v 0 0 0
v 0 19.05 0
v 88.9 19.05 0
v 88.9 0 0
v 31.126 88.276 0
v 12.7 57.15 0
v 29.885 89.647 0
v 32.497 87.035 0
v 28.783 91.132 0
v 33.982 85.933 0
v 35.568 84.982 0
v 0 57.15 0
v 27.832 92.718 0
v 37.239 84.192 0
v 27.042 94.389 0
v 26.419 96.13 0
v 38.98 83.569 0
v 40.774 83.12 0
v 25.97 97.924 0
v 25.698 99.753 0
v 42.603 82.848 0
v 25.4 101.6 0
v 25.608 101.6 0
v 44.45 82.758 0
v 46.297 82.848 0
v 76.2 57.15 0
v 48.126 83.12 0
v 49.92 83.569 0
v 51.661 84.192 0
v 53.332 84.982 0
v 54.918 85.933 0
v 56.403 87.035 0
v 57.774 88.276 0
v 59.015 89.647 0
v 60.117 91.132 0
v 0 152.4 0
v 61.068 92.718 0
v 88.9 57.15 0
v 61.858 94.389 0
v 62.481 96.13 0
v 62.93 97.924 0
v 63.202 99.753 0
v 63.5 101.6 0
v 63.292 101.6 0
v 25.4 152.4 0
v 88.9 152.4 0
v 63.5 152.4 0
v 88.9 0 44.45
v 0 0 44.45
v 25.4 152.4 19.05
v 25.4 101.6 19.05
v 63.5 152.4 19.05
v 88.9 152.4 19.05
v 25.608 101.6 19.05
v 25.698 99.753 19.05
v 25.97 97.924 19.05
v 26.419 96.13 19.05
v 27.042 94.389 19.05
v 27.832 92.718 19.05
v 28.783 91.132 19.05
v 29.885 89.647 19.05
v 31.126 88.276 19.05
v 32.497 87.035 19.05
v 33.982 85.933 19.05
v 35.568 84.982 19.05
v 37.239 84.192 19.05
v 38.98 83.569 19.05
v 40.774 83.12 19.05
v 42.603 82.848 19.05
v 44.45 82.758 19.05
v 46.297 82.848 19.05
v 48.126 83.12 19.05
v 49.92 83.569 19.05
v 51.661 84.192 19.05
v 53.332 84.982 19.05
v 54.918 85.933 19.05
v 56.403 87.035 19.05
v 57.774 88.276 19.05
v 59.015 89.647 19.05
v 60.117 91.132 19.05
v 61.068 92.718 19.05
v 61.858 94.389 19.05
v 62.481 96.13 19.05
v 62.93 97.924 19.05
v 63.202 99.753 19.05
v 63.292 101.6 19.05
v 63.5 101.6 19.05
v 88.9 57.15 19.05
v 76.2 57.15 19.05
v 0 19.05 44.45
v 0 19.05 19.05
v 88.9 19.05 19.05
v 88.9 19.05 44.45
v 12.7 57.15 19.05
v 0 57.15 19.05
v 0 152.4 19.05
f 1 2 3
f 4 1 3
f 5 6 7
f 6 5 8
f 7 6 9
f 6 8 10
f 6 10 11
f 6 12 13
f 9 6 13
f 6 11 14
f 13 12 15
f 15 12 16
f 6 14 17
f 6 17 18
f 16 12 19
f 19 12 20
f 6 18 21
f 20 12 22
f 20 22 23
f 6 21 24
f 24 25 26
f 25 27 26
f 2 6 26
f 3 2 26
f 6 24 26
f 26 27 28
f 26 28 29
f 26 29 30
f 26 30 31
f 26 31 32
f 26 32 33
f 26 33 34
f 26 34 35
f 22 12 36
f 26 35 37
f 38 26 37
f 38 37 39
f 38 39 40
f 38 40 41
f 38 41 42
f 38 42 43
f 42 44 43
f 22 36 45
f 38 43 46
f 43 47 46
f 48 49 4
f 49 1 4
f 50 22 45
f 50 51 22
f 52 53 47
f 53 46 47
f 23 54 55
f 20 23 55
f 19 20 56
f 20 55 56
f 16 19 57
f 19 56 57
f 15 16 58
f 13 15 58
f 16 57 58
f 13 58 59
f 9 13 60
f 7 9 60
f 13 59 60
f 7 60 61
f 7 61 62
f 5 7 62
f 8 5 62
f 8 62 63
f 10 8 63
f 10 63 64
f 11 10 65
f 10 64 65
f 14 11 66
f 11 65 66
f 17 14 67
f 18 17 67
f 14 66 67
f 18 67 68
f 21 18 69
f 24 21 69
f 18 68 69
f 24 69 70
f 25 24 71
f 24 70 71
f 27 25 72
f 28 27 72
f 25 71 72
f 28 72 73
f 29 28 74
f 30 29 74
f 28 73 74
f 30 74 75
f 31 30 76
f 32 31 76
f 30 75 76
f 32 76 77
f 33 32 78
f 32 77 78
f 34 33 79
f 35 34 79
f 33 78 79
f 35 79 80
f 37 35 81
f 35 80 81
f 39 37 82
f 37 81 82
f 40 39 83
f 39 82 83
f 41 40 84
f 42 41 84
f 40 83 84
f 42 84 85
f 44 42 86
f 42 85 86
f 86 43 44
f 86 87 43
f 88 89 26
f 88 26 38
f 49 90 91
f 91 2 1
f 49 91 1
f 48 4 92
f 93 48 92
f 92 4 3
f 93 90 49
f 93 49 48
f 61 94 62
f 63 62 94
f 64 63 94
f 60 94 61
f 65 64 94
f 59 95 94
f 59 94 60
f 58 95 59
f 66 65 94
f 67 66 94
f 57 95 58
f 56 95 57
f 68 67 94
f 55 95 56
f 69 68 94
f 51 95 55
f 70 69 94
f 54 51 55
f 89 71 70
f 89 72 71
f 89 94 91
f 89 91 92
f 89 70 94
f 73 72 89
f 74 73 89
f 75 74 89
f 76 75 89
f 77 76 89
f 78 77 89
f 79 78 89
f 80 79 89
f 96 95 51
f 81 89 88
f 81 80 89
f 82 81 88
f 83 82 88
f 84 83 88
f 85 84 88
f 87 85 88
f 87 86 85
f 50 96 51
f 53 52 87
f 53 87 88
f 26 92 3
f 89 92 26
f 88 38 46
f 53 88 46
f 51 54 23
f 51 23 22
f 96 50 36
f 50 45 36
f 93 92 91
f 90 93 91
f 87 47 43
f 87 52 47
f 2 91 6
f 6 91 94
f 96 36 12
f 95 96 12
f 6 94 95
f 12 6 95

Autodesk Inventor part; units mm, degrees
ref_plane "YZ Plane" through (0, 0, 0) normal (1, 0, 0) x (0, 1, 0)
ref_plane "XZ Plane" through (0, 0, 0) normal (0, 1, 0) x (-1, 0, 0)
ref_plane "XY Plane" through (0, 0, 0) normal (0, 0, 1) x (1, 0, 0)
sketch "Sketch1" plane through (0, 0, 0) normal (0, 0, 1) x (1, 0, 0)
  line L0 (0, 0) -> (88.9, 0)
  line L1 (88.9, 0) -> (88.9, 152.4)
  line L2 (88.9, 152.4) -> (0, 152.4)
  line L3 (0, 152.4) -> (0, 0)
  dimension "d0" = 152.4
  dimension "d1" = 88.9
extrude "Extrusion1" add sketch "Sketch1" along normal blind 19.05
sketch "Sketch2" plane through (0, 0, 19.05) normal (0, 0, 1) x (1, 0, 0)
  line L0 (0, 0) -> (88.9, 0)
  line L1 (88.9, 0) -> (88.9, 19.05)
  line L2 (88.9, 19.05) -> (0, 19.05)
  line L3 (0, 19.05) -> (0, 0)
  line L4 (88.9, 0) -> (88.9, 152.4) projected
  dimension "d4" = 19.05
extrude "Extrusion2" add sketch "Sketch2" along normal blind 25.4
sketch "Sketch3" plane through (0, 0, 19.05) normal (0, 0, 1) x (1, 0, 0)
  line L0 (25.4, 166.2997) -> (63.5, 166.2997)
  line L1 (63.5, 166.2997) -> (63.5, 101.6)
  line L2 (63.5, 101.6) -> (25.4, 101.6)
  line L3 (25.4, 101.6) -> (25.4, 166.2997)
  line L4 (88.9, 152.4) -> (0, 152.4) projected
  arc A0 (25.6076, 101.6) -> (63.2924, 101.6) centre (44.45, 101.6) ccw
  point P0 (0, 0)
  dimension "d7" = 25.4
  dimension "d8" = 25.4
  dimension "d9" = 50.8
extrude "Extrusion3" cut sketch "Sketch3" against normal blind 25.4
sketch "Sketch4" plane through (0, 0, 19.05) normal (0, 0, 1) x (1, 0, 0)
  line L0 (0, 19.05) -> (12.7, 57.15)
  line L1 (12.7, 57.15) -> (0, 57.15)
  line L2 (0, 19.05) -> (88.9, 19.05) projected
  line L3 (0, 19.05) -> (0, 57.15)
  line L4 (0, 152.4) -> (0, 0) projected
  line L5 (88.9, 19.05) -> (88.9, 57.15)
  line L6 (88.9, 0) -> (88.9, 152.4) projected
  line L7 (76.2, 57.15) -> (88.9, 19.05)
  line L8 (76.2, 57.15) -> (88.9, 57.15)
  line L9 (88.9, 19.05) -> (88.9, 57.15)
  dimension "d12" = 12.7
  dimension "d13" = 38.1
  dimension "d14" = 12.7
  dimension "d15" = 38.1
extrude "Extrusion4" cut sketch "Sketch4" against normal blind 25.4 contours L3 L1 L0
sketch "Sketch5" plane through (0, 0, 19.05) normal (0, 0, 1) x (1, 0, 0)
  line L0 (88.9, 19.05) -> (76.2, 57.15)
  line L1 (76.2, 57.15) -> (88.9, 57.15)
  line L2 (88.9, 19.05) -> (88.9, 152.4) projected
  point P0 (0, 0)
  dimension "d18" = 12.7
  dimension "d19" = 38.1
extrude "Extrusion5" cut sketch "Sketch5" against normal blind 25.4
properties part number "Guide Fork CAD" material "Aluminum 6061"
